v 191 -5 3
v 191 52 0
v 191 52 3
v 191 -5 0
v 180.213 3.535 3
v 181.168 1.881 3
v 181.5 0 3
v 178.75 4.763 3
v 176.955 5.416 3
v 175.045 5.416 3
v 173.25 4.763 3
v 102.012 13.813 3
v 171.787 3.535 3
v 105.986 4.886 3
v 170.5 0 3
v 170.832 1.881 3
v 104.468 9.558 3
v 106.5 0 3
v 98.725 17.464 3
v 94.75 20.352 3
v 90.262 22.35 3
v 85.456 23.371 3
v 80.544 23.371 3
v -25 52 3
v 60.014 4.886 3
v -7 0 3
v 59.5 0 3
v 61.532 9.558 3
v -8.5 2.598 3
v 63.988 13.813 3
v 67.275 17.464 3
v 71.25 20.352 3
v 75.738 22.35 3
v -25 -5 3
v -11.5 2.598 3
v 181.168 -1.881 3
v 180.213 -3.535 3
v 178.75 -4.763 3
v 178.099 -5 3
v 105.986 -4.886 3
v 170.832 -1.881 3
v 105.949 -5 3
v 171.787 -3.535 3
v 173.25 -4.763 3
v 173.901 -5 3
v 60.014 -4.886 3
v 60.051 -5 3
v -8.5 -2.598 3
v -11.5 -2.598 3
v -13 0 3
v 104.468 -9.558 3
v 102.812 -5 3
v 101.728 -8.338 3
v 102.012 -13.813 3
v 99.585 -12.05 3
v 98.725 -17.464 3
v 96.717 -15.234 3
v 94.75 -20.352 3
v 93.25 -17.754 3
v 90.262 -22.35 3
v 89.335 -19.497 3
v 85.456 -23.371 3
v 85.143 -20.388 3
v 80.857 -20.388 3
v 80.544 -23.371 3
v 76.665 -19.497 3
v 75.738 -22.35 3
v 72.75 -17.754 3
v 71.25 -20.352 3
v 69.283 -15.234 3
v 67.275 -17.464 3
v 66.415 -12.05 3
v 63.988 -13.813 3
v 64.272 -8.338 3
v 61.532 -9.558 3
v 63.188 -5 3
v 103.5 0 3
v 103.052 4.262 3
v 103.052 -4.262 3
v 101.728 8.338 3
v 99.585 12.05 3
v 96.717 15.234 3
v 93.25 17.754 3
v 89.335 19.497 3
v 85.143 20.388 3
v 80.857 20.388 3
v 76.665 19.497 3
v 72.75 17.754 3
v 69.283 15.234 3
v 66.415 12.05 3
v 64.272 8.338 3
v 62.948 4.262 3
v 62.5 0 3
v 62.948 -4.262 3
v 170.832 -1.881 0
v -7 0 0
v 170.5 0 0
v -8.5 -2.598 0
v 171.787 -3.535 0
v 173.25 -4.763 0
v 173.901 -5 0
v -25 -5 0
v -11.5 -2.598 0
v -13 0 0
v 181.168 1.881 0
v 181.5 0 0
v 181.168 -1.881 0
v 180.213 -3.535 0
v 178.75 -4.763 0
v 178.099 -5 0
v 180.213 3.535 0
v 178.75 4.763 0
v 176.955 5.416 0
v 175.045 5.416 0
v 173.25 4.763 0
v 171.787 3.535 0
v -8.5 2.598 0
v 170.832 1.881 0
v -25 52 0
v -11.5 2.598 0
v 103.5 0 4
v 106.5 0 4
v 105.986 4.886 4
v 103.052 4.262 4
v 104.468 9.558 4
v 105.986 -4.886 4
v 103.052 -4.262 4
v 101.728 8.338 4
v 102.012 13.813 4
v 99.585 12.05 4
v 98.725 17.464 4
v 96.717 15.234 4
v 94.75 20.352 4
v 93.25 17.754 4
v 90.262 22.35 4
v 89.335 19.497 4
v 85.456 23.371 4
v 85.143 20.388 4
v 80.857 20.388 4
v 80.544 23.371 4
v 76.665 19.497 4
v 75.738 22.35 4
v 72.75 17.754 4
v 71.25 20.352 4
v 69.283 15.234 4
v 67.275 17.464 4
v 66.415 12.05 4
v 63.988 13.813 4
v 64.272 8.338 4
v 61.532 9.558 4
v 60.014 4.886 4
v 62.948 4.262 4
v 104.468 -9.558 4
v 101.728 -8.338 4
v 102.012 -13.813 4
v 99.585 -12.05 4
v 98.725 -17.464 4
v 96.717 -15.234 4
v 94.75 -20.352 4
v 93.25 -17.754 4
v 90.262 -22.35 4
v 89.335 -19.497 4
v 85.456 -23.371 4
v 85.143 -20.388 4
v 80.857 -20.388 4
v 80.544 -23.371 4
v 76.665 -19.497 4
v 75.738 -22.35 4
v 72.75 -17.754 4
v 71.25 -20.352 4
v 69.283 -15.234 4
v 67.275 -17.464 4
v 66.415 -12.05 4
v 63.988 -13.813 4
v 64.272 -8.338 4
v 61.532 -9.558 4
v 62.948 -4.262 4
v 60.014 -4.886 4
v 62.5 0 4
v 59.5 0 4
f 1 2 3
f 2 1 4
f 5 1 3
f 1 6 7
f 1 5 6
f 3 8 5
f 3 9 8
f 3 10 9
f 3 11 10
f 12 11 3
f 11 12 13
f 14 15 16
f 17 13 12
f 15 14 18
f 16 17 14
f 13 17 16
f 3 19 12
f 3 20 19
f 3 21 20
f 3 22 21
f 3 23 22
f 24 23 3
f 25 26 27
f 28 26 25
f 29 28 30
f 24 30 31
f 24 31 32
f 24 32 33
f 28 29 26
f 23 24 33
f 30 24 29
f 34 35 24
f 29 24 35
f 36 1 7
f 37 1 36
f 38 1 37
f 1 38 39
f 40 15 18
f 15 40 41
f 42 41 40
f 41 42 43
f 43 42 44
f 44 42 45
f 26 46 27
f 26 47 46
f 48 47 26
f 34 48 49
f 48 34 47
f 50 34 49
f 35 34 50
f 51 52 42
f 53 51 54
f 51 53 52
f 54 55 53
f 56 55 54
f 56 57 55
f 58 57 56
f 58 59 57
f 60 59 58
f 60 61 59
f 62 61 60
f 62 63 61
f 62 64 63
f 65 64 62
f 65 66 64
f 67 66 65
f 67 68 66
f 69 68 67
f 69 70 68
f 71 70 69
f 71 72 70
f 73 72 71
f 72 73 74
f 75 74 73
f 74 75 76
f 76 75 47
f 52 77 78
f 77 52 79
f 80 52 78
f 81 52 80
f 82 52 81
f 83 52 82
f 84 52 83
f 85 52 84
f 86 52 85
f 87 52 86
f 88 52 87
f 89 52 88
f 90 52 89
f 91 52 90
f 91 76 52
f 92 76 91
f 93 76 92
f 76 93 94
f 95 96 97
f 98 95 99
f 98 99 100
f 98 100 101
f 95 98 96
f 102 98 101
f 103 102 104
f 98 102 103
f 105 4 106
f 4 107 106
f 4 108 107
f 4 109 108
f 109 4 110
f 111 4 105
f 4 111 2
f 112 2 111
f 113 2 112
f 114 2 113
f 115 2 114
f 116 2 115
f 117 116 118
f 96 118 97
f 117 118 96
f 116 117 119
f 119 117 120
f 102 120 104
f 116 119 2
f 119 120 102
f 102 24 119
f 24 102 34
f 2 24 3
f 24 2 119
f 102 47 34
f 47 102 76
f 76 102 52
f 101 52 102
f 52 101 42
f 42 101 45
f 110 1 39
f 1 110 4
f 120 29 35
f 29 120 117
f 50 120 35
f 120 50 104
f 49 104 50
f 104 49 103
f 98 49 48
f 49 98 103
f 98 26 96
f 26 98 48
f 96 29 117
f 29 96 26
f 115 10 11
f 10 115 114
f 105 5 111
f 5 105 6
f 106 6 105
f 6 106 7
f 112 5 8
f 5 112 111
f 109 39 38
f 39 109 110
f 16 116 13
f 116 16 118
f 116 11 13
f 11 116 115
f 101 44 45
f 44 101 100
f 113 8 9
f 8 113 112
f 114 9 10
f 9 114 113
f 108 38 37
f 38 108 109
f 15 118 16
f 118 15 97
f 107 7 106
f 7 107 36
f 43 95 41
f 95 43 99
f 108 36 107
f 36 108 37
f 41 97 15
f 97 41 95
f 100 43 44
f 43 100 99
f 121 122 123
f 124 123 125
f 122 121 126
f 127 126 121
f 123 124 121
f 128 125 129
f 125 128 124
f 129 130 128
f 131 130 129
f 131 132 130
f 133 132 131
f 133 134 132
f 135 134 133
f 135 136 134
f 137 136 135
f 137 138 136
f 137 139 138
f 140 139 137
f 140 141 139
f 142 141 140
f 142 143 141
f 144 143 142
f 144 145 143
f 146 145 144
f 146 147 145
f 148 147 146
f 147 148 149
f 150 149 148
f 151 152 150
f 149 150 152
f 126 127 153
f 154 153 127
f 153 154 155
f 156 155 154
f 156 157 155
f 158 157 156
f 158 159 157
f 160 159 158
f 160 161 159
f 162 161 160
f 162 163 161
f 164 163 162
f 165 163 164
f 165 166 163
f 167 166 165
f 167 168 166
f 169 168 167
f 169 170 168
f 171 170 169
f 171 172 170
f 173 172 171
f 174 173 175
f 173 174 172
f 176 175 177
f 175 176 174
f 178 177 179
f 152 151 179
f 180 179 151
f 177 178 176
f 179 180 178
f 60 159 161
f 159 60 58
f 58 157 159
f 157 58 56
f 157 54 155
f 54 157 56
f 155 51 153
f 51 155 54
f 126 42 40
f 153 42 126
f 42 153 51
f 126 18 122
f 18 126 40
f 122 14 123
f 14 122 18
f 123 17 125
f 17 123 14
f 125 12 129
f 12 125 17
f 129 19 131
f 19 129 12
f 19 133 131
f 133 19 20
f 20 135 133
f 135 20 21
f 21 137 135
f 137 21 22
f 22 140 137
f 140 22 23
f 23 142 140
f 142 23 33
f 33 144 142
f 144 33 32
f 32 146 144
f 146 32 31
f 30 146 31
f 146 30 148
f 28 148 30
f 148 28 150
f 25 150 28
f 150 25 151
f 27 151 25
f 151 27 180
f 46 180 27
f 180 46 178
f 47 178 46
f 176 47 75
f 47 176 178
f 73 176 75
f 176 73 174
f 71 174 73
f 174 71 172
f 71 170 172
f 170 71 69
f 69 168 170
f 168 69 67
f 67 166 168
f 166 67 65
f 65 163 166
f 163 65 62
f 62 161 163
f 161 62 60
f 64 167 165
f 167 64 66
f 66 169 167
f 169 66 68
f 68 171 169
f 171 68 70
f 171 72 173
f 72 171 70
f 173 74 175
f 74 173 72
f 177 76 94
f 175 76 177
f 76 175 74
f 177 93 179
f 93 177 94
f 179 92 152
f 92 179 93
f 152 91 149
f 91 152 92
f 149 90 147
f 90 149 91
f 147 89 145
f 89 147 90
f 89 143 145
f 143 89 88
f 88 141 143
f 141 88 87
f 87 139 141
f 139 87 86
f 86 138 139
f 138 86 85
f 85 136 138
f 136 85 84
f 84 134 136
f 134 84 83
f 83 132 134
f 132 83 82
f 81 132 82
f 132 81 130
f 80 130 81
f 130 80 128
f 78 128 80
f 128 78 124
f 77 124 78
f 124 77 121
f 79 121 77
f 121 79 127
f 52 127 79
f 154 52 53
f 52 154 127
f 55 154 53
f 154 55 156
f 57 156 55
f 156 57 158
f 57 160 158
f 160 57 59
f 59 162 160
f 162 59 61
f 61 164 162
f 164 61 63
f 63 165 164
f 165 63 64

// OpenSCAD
// Fit-Check Jig — Main Brush Roller (Roborock S5-family, A1 code)
// =================================================================
//
// Purpose:
//   1. Verify the roller LENGTH fits the brush bay end-to-end (drive socket
//      face to journal bearing seat).
//   2. Verify the DRIVE STUB (hex ∅5.5 across-flats, estimate) fits the
//      gearmotor hex socket, and the JOURNAL end (∅10 mm, estimate) fits the
//      chassis bushing.
//   3. Verify the bristle envelope (∅45 mm, estimate) clears the bay floor
//      and brush cover.
//
// This jig is a flat template with two pockets: one to seat the journal end
// and an alignment slot for the drive stub. Print flat; drop the part in.
//
// Dimension source: main-brush-roller/main-brush-roller.scad (all estimates).
// Licensed CC0.

// ===== PARAMETERS (keep in sync with the roller model) =====
roller_total_len   = 176.0;   // mm (estimate)
drive_stub_afl     = 5.5;    // mm (estimate) hex across-flats, mates gearmotor
journal_dia        = 10.0;   // mm (estimate)
brush_od           = 45.0;   // mm (estimate) bristle envelope

// ---- Jig tuning ----
template_len       = roller_total_len + 40;   // mm, overhang for handling
clearance_loose    = 1.0;    // mm, generous slip-fit allowance
socket_hex_clr     = 0.5;    // mm, extra over hex across-flats
wall               = 5.0;    // mm, template border thickness
plate_z            = 3.0;    // mm, template thickness

// ===== JIG =====
module template_body() {
    translate([-25, -wall, 0])
        cube([template_len, 2 * wall + brush_od + 2 * clearance_loose, plate_z]);
}

module drive_socket_pocket() {
    // Hex pocket (across-flats 5.5 + clearance) to test the roller drive stub
    translate([-25 + 15, 0, -0.1])
        linear_extrude(height = plate_z + 0.2)
            circle(d = drive_stub_afl + socket_hex_clr, $fn = 6);
}

module journal_pocket() {
    // Round pocket to rest the journal end
    x = -25 + template_len - 15;
    translate([x, 0, -0.1])
        cylinder(d = journal_dia + clearance_loose, h = plate_z + 0.2);
}

module bristle_clearance_arc() {
    // A printed arc at ∅45+clearance showing where the bristle envelope must fit
    translate([-25 + template_len / 2, 0, 0])
    difference() {
        circle(d = brush_od + 2 * clearance_loose);
        circle(d = brush_od - 4);
    }
}

module jig_main_brush_roller() {
    // Negative-space template: seats both roller ends and marks the envelope
    difference() {
        template_body();
        drive_socket_pocket();
        journal_pocket();
    }
    // Envelope indicator printed proud on top
    color("#a0a0a0")
    translate([0, 0, plate_z])
        linear_extrude(height = 1.0)
            bristle_clearance_arc();
}

jig_main_brush_roller();
